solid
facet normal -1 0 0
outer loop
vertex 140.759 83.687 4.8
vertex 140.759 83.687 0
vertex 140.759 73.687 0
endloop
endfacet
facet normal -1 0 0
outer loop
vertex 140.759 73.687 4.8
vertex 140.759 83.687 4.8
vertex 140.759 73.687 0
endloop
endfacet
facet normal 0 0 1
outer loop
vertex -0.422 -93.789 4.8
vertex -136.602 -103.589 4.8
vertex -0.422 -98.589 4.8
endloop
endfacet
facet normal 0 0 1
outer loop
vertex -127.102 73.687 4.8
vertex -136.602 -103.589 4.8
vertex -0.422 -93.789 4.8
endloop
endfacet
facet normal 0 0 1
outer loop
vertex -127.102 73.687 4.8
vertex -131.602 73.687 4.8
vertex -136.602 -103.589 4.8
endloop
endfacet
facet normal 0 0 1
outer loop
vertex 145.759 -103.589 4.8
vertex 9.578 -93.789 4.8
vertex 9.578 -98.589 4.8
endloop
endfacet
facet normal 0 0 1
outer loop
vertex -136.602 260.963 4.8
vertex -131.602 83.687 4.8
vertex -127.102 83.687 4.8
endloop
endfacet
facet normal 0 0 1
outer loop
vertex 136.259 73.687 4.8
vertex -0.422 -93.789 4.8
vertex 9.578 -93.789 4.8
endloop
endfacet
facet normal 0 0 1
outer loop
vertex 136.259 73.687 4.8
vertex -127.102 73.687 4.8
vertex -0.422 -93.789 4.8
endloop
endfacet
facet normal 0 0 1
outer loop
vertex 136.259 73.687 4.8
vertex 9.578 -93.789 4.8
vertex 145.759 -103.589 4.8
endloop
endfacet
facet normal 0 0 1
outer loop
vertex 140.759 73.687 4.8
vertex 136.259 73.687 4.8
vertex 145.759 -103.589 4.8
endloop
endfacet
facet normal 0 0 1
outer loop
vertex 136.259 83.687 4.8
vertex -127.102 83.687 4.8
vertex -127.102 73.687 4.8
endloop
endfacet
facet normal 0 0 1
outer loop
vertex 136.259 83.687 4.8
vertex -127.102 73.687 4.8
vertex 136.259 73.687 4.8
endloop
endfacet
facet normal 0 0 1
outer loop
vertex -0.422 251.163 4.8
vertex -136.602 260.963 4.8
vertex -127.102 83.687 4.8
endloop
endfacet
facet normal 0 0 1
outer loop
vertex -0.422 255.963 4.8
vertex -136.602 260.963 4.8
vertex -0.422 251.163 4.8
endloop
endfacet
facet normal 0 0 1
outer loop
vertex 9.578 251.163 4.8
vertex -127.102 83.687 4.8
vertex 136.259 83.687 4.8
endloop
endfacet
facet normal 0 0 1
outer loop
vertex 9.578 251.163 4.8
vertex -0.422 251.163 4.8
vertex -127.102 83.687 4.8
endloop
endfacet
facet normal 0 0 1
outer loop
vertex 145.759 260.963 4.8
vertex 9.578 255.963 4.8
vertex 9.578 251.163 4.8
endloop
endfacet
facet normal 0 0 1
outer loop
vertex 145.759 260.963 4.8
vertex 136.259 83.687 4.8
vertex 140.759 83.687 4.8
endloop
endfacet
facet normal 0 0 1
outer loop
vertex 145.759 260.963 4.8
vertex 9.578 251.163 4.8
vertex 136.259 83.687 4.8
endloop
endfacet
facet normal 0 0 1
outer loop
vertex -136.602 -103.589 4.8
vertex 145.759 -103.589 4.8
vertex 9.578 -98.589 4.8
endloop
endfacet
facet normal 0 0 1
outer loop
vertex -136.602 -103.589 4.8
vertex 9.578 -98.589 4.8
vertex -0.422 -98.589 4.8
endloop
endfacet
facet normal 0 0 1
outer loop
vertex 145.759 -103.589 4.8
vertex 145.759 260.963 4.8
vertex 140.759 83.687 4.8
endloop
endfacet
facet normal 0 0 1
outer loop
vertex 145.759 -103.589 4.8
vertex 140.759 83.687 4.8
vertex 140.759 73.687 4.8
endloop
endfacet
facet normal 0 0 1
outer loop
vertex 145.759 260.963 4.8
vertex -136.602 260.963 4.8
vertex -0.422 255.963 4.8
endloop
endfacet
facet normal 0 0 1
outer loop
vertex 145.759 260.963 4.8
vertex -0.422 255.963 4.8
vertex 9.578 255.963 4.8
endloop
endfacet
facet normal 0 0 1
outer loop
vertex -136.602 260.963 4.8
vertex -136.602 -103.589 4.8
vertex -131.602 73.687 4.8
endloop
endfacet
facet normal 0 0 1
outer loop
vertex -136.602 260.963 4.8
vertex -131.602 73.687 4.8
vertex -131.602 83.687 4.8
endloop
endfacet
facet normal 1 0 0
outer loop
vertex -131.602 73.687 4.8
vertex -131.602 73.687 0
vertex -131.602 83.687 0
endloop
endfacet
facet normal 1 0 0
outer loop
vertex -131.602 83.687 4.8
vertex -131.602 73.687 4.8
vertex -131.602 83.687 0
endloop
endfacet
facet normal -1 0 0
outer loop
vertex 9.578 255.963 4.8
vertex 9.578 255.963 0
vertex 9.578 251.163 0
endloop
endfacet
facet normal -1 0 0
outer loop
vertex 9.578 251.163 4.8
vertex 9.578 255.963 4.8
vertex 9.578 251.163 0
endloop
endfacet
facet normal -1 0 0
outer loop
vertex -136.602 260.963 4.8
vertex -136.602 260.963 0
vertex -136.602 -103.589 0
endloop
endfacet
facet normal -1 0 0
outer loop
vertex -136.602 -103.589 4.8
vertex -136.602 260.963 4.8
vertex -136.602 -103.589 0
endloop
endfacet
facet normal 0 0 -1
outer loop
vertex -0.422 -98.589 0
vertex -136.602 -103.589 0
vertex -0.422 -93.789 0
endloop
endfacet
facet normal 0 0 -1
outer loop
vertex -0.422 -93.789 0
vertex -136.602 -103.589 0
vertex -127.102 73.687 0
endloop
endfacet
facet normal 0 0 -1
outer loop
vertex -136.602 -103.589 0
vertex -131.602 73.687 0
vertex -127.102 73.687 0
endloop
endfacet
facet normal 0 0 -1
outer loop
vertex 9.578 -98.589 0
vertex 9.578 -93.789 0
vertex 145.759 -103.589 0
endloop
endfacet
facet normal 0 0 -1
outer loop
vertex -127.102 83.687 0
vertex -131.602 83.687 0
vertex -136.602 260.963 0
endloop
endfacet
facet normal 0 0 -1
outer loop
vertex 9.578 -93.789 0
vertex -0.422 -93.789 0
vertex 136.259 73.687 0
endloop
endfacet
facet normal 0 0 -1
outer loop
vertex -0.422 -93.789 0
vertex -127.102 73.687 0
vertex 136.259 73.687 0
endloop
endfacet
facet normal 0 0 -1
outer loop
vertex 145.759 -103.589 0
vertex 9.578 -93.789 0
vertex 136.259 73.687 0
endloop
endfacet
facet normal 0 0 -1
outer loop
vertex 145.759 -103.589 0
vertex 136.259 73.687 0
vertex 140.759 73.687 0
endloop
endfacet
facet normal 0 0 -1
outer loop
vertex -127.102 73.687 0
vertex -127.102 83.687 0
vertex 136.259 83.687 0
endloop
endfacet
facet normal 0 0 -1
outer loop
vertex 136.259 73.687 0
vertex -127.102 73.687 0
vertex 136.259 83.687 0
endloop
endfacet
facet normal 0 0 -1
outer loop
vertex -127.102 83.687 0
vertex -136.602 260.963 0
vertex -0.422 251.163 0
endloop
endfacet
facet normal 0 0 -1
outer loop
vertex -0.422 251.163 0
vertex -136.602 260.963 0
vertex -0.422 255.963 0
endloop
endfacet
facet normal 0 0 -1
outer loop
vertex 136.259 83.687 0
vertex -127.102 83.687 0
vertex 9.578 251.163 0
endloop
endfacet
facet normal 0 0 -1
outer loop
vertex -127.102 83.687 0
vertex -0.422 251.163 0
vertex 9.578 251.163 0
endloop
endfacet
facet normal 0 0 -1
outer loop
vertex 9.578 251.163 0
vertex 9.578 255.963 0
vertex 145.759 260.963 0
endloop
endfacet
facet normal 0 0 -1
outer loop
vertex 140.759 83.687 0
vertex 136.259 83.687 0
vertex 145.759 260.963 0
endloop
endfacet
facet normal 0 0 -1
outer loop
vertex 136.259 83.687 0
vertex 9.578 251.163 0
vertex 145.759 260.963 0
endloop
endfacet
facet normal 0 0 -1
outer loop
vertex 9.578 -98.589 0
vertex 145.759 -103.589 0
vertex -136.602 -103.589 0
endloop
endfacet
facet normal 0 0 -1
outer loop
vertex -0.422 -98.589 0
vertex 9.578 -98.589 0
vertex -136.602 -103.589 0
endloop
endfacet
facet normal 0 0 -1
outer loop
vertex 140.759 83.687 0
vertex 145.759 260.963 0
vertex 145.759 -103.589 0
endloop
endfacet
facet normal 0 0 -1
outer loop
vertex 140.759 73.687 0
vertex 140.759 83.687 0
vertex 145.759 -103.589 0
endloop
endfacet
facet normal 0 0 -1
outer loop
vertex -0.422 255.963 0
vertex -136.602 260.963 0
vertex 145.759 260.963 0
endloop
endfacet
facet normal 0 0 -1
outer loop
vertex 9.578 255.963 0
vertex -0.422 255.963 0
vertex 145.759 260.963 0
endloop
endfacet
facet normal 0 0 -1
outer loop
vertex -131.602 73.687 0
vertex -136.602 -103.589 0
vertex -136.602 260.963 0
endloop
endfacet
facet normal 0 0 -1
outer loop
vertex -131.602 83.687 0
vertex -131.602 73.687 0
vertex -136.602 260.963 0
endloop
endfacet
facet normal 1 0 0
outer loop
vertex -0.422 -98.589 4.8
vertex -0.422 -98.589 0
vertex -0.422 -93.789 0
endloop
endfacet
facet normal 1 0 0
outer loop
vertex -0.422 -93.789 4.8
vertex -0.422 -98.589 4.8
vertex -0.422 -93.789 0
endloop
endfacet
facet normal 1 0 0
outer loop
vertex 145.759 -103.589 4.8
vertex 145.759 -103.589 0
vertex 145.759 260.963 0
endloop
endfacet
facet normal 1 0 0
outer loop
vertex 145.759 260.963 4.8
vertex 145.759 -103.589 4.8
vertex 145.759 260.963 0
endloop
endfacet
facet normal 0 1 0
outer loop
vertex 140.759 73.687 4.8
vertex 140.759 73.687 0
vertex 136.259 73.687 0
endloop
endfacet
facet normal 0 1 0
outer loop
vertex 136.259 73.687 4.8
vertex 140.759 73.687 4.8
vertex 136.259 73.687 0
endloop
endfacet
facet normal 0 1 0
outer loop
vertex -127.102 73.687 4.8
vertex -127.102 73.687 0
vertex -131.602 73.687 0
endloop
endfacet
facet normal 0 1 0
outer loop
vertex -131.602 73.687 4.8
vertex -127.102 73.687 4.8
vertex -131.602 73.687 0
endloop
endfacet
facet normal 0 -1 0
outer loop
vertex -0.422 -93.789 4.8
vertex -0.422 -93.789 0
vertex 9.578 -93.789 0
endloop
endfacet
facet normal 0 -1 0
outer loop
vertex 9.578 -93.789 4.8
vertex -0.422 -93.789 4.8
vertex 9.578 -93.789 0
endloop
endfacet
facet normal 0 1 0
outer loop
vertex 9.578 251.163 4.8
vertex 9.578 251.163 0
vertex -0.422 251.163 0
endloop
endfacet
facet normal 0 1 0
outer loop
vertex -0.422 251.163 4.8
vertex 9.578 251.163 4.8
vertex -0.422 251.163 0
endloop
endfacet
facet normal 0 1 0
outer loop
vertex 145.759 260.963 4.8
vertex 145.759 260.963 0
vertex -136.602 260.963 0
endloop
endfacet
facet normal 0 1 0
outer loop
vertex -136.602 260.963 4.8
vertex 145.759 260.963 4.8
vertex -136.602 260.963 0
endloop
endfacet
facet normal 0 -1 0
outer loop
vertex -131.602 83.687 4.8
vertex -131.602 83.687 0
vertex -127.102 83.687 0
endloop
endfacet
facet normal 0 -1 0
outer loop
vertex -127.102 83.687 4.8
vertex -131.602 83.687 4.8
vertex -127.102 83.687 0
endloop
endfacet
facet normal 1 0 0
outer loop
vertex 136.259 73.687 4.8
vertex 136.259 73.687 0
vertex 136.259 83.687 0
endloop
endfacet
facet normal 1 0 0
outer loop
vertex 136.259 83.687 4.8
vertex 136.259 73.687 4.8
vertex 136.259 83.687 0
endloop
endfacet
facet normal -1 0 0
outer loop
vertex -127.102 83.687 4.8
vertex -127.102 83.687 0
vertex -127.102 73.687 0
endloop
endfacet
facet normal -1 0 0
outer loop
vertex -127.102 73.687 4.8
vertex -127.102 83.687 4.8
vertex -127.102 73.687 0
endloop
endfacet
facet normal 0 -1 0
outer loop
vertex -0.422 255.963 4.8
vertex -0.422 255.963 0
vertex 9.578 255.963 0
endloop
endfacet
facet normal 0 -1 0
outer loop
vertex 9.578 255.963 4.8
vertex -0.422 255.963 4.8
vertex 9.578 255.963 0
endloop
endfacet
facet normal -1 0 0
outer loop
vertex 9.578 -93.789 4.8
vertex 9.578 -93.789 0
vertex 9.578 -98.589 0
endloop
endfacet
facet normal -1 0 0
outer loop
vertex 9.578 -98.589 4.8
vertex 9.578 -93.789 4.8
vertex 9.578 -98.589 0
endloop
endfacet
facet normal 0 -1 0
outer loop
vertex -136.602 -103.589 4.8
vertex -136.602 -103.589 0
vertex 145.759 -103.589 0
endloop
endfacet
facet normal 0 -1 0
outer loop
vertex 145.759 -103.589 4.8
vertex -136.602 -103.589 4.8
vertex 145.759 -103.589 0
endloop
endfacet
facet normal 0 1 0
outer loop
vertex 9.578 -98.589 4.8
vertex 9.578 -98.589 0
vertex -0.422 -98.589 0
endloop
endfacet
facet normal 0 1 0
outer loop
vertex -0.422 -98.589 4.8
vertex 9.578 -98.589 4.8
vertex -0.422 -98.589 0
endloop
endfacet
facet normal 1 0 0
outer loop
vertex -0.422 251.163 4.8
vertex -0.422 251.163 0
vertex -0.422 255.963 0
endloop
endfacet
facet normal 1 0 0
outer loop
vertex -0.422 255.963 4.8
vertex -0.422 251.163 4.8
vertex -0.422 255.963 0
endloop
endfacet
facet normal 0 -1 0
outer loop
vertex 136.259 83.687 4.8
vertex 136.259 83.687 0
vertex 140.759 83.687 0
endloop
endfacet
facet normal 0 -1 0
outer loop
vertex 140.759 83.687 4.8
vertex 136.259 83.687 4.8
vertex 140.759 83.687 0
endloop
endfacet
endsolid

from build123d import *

# Parameters (mm, degrees)
F1_DEPTH = 4.8
F2_DEPTH = 4.8


# Not quite as in the source:
# - a feature names something its author has since deleted; it is built from what else it names


with BuildPart() as f1:
    # F0 (on Top) → F1 (new body)
    with BuildSketch(Plane.XY):
        Polygon((140.7586729476, 255.9633882557), (9.5784879476, 255.9633882557), (9.5784879476, 251.1633882557), (4.5784879476, 251.1633882557), (4.5784879476, 78.6871632557), (4.5784879476, -93.7890617443), (9.5784879476, -93.7890617443), (9.5784879476, -98.5890617443), (140.7586729476, -98.5890617443), (140.7586729476, 73.6871632557), (136.2586729476, 73.6871632557), (136.2586729476, 78.6871632557), (136.2586729476, 83.6871632557), (140.7586729476, 83.6871632557), align=None)
        Polygon((-0.4215120524, 255.9633882557), (-131.6016970524, 255.9633882557), (-131.6016970524, 83.6871632557), (-127.1016970524, 83.6871632557), (-127.1016970524, 78.6871632557), (-127.1016970524, 73.6871632557), (-131.6016970524, 73.6871632557), (-131.6016970524, -98.5890617443), (-0.4215120524, -98.5890617443), (-0.4215120524, -93.7890617443), (4.5784879476, -93.7890617443), (4.5784879476, 78.6871632557), (4.5784879476, 251.1633882557), (-0.4215120524, 251.1633882557), align=None)
        Polygon((-131.6016970524, 83.6871632557), (-131.6016970524, 255.9633882557), (-0.4215120524, 255.9633882557), (9.5784879476, 255.9633882557), (140.7586729476, 255.9633882557), (140.7586729476, 260.9633888568), (-136.6016970524, 260.9633888568), (-136.6016970524, -103.5890617443), (-131.6016970524, -103.5890617443), (-131.6016970524, -98.5890617443), (-131.6016970524, 73.6871632557), (-131.6016970524, 78.6871632557), align=None)
    extrude(amount=F1_DEPTH)

    # F0 (on Top) → F2 (join)
    with BuildSketch(Plane.XY):
        Polygon((-131.6016970524, 83.6871632557), (-131.6016970524, 255.9633882557), (-0.4215120524, 255.9633882557), (9.5784879476, 255.9633882557), (140.7586729476, 255.9633882557), (140.7586729476, 260.9633888568), (-136.6016970524, 260.9633888568), (-136.6016970524, -103.5890617443), (-131.6016970524, -103.5890617443), (-131.6016970524, -98.5890617443), (-131.6016970524, 73.6871632557), (-131.6016970524, 78.6871632557), align=None)
        Polygon((140.7586729476, 260.9633888568), (140.7586729476, 255.9633882557), (140.7586729476, 83.6871632557), (140.7586729476, 78.6871632557), (140.7586729476, 73.6871632557), (140.7586729476, -98.5890617443), (9.5784879476, -98.5890617443), (-0.4215120524, -98.5890617443), (-131.6016970524, -98.5890617443), (-131.6016970524, -103.5890617443), (145.7586729476, -103.5890617443), (145.7586729476, 260.9633888568), align=None)
    extrude(amount=F2_DEPTH)


solid = f1.part
